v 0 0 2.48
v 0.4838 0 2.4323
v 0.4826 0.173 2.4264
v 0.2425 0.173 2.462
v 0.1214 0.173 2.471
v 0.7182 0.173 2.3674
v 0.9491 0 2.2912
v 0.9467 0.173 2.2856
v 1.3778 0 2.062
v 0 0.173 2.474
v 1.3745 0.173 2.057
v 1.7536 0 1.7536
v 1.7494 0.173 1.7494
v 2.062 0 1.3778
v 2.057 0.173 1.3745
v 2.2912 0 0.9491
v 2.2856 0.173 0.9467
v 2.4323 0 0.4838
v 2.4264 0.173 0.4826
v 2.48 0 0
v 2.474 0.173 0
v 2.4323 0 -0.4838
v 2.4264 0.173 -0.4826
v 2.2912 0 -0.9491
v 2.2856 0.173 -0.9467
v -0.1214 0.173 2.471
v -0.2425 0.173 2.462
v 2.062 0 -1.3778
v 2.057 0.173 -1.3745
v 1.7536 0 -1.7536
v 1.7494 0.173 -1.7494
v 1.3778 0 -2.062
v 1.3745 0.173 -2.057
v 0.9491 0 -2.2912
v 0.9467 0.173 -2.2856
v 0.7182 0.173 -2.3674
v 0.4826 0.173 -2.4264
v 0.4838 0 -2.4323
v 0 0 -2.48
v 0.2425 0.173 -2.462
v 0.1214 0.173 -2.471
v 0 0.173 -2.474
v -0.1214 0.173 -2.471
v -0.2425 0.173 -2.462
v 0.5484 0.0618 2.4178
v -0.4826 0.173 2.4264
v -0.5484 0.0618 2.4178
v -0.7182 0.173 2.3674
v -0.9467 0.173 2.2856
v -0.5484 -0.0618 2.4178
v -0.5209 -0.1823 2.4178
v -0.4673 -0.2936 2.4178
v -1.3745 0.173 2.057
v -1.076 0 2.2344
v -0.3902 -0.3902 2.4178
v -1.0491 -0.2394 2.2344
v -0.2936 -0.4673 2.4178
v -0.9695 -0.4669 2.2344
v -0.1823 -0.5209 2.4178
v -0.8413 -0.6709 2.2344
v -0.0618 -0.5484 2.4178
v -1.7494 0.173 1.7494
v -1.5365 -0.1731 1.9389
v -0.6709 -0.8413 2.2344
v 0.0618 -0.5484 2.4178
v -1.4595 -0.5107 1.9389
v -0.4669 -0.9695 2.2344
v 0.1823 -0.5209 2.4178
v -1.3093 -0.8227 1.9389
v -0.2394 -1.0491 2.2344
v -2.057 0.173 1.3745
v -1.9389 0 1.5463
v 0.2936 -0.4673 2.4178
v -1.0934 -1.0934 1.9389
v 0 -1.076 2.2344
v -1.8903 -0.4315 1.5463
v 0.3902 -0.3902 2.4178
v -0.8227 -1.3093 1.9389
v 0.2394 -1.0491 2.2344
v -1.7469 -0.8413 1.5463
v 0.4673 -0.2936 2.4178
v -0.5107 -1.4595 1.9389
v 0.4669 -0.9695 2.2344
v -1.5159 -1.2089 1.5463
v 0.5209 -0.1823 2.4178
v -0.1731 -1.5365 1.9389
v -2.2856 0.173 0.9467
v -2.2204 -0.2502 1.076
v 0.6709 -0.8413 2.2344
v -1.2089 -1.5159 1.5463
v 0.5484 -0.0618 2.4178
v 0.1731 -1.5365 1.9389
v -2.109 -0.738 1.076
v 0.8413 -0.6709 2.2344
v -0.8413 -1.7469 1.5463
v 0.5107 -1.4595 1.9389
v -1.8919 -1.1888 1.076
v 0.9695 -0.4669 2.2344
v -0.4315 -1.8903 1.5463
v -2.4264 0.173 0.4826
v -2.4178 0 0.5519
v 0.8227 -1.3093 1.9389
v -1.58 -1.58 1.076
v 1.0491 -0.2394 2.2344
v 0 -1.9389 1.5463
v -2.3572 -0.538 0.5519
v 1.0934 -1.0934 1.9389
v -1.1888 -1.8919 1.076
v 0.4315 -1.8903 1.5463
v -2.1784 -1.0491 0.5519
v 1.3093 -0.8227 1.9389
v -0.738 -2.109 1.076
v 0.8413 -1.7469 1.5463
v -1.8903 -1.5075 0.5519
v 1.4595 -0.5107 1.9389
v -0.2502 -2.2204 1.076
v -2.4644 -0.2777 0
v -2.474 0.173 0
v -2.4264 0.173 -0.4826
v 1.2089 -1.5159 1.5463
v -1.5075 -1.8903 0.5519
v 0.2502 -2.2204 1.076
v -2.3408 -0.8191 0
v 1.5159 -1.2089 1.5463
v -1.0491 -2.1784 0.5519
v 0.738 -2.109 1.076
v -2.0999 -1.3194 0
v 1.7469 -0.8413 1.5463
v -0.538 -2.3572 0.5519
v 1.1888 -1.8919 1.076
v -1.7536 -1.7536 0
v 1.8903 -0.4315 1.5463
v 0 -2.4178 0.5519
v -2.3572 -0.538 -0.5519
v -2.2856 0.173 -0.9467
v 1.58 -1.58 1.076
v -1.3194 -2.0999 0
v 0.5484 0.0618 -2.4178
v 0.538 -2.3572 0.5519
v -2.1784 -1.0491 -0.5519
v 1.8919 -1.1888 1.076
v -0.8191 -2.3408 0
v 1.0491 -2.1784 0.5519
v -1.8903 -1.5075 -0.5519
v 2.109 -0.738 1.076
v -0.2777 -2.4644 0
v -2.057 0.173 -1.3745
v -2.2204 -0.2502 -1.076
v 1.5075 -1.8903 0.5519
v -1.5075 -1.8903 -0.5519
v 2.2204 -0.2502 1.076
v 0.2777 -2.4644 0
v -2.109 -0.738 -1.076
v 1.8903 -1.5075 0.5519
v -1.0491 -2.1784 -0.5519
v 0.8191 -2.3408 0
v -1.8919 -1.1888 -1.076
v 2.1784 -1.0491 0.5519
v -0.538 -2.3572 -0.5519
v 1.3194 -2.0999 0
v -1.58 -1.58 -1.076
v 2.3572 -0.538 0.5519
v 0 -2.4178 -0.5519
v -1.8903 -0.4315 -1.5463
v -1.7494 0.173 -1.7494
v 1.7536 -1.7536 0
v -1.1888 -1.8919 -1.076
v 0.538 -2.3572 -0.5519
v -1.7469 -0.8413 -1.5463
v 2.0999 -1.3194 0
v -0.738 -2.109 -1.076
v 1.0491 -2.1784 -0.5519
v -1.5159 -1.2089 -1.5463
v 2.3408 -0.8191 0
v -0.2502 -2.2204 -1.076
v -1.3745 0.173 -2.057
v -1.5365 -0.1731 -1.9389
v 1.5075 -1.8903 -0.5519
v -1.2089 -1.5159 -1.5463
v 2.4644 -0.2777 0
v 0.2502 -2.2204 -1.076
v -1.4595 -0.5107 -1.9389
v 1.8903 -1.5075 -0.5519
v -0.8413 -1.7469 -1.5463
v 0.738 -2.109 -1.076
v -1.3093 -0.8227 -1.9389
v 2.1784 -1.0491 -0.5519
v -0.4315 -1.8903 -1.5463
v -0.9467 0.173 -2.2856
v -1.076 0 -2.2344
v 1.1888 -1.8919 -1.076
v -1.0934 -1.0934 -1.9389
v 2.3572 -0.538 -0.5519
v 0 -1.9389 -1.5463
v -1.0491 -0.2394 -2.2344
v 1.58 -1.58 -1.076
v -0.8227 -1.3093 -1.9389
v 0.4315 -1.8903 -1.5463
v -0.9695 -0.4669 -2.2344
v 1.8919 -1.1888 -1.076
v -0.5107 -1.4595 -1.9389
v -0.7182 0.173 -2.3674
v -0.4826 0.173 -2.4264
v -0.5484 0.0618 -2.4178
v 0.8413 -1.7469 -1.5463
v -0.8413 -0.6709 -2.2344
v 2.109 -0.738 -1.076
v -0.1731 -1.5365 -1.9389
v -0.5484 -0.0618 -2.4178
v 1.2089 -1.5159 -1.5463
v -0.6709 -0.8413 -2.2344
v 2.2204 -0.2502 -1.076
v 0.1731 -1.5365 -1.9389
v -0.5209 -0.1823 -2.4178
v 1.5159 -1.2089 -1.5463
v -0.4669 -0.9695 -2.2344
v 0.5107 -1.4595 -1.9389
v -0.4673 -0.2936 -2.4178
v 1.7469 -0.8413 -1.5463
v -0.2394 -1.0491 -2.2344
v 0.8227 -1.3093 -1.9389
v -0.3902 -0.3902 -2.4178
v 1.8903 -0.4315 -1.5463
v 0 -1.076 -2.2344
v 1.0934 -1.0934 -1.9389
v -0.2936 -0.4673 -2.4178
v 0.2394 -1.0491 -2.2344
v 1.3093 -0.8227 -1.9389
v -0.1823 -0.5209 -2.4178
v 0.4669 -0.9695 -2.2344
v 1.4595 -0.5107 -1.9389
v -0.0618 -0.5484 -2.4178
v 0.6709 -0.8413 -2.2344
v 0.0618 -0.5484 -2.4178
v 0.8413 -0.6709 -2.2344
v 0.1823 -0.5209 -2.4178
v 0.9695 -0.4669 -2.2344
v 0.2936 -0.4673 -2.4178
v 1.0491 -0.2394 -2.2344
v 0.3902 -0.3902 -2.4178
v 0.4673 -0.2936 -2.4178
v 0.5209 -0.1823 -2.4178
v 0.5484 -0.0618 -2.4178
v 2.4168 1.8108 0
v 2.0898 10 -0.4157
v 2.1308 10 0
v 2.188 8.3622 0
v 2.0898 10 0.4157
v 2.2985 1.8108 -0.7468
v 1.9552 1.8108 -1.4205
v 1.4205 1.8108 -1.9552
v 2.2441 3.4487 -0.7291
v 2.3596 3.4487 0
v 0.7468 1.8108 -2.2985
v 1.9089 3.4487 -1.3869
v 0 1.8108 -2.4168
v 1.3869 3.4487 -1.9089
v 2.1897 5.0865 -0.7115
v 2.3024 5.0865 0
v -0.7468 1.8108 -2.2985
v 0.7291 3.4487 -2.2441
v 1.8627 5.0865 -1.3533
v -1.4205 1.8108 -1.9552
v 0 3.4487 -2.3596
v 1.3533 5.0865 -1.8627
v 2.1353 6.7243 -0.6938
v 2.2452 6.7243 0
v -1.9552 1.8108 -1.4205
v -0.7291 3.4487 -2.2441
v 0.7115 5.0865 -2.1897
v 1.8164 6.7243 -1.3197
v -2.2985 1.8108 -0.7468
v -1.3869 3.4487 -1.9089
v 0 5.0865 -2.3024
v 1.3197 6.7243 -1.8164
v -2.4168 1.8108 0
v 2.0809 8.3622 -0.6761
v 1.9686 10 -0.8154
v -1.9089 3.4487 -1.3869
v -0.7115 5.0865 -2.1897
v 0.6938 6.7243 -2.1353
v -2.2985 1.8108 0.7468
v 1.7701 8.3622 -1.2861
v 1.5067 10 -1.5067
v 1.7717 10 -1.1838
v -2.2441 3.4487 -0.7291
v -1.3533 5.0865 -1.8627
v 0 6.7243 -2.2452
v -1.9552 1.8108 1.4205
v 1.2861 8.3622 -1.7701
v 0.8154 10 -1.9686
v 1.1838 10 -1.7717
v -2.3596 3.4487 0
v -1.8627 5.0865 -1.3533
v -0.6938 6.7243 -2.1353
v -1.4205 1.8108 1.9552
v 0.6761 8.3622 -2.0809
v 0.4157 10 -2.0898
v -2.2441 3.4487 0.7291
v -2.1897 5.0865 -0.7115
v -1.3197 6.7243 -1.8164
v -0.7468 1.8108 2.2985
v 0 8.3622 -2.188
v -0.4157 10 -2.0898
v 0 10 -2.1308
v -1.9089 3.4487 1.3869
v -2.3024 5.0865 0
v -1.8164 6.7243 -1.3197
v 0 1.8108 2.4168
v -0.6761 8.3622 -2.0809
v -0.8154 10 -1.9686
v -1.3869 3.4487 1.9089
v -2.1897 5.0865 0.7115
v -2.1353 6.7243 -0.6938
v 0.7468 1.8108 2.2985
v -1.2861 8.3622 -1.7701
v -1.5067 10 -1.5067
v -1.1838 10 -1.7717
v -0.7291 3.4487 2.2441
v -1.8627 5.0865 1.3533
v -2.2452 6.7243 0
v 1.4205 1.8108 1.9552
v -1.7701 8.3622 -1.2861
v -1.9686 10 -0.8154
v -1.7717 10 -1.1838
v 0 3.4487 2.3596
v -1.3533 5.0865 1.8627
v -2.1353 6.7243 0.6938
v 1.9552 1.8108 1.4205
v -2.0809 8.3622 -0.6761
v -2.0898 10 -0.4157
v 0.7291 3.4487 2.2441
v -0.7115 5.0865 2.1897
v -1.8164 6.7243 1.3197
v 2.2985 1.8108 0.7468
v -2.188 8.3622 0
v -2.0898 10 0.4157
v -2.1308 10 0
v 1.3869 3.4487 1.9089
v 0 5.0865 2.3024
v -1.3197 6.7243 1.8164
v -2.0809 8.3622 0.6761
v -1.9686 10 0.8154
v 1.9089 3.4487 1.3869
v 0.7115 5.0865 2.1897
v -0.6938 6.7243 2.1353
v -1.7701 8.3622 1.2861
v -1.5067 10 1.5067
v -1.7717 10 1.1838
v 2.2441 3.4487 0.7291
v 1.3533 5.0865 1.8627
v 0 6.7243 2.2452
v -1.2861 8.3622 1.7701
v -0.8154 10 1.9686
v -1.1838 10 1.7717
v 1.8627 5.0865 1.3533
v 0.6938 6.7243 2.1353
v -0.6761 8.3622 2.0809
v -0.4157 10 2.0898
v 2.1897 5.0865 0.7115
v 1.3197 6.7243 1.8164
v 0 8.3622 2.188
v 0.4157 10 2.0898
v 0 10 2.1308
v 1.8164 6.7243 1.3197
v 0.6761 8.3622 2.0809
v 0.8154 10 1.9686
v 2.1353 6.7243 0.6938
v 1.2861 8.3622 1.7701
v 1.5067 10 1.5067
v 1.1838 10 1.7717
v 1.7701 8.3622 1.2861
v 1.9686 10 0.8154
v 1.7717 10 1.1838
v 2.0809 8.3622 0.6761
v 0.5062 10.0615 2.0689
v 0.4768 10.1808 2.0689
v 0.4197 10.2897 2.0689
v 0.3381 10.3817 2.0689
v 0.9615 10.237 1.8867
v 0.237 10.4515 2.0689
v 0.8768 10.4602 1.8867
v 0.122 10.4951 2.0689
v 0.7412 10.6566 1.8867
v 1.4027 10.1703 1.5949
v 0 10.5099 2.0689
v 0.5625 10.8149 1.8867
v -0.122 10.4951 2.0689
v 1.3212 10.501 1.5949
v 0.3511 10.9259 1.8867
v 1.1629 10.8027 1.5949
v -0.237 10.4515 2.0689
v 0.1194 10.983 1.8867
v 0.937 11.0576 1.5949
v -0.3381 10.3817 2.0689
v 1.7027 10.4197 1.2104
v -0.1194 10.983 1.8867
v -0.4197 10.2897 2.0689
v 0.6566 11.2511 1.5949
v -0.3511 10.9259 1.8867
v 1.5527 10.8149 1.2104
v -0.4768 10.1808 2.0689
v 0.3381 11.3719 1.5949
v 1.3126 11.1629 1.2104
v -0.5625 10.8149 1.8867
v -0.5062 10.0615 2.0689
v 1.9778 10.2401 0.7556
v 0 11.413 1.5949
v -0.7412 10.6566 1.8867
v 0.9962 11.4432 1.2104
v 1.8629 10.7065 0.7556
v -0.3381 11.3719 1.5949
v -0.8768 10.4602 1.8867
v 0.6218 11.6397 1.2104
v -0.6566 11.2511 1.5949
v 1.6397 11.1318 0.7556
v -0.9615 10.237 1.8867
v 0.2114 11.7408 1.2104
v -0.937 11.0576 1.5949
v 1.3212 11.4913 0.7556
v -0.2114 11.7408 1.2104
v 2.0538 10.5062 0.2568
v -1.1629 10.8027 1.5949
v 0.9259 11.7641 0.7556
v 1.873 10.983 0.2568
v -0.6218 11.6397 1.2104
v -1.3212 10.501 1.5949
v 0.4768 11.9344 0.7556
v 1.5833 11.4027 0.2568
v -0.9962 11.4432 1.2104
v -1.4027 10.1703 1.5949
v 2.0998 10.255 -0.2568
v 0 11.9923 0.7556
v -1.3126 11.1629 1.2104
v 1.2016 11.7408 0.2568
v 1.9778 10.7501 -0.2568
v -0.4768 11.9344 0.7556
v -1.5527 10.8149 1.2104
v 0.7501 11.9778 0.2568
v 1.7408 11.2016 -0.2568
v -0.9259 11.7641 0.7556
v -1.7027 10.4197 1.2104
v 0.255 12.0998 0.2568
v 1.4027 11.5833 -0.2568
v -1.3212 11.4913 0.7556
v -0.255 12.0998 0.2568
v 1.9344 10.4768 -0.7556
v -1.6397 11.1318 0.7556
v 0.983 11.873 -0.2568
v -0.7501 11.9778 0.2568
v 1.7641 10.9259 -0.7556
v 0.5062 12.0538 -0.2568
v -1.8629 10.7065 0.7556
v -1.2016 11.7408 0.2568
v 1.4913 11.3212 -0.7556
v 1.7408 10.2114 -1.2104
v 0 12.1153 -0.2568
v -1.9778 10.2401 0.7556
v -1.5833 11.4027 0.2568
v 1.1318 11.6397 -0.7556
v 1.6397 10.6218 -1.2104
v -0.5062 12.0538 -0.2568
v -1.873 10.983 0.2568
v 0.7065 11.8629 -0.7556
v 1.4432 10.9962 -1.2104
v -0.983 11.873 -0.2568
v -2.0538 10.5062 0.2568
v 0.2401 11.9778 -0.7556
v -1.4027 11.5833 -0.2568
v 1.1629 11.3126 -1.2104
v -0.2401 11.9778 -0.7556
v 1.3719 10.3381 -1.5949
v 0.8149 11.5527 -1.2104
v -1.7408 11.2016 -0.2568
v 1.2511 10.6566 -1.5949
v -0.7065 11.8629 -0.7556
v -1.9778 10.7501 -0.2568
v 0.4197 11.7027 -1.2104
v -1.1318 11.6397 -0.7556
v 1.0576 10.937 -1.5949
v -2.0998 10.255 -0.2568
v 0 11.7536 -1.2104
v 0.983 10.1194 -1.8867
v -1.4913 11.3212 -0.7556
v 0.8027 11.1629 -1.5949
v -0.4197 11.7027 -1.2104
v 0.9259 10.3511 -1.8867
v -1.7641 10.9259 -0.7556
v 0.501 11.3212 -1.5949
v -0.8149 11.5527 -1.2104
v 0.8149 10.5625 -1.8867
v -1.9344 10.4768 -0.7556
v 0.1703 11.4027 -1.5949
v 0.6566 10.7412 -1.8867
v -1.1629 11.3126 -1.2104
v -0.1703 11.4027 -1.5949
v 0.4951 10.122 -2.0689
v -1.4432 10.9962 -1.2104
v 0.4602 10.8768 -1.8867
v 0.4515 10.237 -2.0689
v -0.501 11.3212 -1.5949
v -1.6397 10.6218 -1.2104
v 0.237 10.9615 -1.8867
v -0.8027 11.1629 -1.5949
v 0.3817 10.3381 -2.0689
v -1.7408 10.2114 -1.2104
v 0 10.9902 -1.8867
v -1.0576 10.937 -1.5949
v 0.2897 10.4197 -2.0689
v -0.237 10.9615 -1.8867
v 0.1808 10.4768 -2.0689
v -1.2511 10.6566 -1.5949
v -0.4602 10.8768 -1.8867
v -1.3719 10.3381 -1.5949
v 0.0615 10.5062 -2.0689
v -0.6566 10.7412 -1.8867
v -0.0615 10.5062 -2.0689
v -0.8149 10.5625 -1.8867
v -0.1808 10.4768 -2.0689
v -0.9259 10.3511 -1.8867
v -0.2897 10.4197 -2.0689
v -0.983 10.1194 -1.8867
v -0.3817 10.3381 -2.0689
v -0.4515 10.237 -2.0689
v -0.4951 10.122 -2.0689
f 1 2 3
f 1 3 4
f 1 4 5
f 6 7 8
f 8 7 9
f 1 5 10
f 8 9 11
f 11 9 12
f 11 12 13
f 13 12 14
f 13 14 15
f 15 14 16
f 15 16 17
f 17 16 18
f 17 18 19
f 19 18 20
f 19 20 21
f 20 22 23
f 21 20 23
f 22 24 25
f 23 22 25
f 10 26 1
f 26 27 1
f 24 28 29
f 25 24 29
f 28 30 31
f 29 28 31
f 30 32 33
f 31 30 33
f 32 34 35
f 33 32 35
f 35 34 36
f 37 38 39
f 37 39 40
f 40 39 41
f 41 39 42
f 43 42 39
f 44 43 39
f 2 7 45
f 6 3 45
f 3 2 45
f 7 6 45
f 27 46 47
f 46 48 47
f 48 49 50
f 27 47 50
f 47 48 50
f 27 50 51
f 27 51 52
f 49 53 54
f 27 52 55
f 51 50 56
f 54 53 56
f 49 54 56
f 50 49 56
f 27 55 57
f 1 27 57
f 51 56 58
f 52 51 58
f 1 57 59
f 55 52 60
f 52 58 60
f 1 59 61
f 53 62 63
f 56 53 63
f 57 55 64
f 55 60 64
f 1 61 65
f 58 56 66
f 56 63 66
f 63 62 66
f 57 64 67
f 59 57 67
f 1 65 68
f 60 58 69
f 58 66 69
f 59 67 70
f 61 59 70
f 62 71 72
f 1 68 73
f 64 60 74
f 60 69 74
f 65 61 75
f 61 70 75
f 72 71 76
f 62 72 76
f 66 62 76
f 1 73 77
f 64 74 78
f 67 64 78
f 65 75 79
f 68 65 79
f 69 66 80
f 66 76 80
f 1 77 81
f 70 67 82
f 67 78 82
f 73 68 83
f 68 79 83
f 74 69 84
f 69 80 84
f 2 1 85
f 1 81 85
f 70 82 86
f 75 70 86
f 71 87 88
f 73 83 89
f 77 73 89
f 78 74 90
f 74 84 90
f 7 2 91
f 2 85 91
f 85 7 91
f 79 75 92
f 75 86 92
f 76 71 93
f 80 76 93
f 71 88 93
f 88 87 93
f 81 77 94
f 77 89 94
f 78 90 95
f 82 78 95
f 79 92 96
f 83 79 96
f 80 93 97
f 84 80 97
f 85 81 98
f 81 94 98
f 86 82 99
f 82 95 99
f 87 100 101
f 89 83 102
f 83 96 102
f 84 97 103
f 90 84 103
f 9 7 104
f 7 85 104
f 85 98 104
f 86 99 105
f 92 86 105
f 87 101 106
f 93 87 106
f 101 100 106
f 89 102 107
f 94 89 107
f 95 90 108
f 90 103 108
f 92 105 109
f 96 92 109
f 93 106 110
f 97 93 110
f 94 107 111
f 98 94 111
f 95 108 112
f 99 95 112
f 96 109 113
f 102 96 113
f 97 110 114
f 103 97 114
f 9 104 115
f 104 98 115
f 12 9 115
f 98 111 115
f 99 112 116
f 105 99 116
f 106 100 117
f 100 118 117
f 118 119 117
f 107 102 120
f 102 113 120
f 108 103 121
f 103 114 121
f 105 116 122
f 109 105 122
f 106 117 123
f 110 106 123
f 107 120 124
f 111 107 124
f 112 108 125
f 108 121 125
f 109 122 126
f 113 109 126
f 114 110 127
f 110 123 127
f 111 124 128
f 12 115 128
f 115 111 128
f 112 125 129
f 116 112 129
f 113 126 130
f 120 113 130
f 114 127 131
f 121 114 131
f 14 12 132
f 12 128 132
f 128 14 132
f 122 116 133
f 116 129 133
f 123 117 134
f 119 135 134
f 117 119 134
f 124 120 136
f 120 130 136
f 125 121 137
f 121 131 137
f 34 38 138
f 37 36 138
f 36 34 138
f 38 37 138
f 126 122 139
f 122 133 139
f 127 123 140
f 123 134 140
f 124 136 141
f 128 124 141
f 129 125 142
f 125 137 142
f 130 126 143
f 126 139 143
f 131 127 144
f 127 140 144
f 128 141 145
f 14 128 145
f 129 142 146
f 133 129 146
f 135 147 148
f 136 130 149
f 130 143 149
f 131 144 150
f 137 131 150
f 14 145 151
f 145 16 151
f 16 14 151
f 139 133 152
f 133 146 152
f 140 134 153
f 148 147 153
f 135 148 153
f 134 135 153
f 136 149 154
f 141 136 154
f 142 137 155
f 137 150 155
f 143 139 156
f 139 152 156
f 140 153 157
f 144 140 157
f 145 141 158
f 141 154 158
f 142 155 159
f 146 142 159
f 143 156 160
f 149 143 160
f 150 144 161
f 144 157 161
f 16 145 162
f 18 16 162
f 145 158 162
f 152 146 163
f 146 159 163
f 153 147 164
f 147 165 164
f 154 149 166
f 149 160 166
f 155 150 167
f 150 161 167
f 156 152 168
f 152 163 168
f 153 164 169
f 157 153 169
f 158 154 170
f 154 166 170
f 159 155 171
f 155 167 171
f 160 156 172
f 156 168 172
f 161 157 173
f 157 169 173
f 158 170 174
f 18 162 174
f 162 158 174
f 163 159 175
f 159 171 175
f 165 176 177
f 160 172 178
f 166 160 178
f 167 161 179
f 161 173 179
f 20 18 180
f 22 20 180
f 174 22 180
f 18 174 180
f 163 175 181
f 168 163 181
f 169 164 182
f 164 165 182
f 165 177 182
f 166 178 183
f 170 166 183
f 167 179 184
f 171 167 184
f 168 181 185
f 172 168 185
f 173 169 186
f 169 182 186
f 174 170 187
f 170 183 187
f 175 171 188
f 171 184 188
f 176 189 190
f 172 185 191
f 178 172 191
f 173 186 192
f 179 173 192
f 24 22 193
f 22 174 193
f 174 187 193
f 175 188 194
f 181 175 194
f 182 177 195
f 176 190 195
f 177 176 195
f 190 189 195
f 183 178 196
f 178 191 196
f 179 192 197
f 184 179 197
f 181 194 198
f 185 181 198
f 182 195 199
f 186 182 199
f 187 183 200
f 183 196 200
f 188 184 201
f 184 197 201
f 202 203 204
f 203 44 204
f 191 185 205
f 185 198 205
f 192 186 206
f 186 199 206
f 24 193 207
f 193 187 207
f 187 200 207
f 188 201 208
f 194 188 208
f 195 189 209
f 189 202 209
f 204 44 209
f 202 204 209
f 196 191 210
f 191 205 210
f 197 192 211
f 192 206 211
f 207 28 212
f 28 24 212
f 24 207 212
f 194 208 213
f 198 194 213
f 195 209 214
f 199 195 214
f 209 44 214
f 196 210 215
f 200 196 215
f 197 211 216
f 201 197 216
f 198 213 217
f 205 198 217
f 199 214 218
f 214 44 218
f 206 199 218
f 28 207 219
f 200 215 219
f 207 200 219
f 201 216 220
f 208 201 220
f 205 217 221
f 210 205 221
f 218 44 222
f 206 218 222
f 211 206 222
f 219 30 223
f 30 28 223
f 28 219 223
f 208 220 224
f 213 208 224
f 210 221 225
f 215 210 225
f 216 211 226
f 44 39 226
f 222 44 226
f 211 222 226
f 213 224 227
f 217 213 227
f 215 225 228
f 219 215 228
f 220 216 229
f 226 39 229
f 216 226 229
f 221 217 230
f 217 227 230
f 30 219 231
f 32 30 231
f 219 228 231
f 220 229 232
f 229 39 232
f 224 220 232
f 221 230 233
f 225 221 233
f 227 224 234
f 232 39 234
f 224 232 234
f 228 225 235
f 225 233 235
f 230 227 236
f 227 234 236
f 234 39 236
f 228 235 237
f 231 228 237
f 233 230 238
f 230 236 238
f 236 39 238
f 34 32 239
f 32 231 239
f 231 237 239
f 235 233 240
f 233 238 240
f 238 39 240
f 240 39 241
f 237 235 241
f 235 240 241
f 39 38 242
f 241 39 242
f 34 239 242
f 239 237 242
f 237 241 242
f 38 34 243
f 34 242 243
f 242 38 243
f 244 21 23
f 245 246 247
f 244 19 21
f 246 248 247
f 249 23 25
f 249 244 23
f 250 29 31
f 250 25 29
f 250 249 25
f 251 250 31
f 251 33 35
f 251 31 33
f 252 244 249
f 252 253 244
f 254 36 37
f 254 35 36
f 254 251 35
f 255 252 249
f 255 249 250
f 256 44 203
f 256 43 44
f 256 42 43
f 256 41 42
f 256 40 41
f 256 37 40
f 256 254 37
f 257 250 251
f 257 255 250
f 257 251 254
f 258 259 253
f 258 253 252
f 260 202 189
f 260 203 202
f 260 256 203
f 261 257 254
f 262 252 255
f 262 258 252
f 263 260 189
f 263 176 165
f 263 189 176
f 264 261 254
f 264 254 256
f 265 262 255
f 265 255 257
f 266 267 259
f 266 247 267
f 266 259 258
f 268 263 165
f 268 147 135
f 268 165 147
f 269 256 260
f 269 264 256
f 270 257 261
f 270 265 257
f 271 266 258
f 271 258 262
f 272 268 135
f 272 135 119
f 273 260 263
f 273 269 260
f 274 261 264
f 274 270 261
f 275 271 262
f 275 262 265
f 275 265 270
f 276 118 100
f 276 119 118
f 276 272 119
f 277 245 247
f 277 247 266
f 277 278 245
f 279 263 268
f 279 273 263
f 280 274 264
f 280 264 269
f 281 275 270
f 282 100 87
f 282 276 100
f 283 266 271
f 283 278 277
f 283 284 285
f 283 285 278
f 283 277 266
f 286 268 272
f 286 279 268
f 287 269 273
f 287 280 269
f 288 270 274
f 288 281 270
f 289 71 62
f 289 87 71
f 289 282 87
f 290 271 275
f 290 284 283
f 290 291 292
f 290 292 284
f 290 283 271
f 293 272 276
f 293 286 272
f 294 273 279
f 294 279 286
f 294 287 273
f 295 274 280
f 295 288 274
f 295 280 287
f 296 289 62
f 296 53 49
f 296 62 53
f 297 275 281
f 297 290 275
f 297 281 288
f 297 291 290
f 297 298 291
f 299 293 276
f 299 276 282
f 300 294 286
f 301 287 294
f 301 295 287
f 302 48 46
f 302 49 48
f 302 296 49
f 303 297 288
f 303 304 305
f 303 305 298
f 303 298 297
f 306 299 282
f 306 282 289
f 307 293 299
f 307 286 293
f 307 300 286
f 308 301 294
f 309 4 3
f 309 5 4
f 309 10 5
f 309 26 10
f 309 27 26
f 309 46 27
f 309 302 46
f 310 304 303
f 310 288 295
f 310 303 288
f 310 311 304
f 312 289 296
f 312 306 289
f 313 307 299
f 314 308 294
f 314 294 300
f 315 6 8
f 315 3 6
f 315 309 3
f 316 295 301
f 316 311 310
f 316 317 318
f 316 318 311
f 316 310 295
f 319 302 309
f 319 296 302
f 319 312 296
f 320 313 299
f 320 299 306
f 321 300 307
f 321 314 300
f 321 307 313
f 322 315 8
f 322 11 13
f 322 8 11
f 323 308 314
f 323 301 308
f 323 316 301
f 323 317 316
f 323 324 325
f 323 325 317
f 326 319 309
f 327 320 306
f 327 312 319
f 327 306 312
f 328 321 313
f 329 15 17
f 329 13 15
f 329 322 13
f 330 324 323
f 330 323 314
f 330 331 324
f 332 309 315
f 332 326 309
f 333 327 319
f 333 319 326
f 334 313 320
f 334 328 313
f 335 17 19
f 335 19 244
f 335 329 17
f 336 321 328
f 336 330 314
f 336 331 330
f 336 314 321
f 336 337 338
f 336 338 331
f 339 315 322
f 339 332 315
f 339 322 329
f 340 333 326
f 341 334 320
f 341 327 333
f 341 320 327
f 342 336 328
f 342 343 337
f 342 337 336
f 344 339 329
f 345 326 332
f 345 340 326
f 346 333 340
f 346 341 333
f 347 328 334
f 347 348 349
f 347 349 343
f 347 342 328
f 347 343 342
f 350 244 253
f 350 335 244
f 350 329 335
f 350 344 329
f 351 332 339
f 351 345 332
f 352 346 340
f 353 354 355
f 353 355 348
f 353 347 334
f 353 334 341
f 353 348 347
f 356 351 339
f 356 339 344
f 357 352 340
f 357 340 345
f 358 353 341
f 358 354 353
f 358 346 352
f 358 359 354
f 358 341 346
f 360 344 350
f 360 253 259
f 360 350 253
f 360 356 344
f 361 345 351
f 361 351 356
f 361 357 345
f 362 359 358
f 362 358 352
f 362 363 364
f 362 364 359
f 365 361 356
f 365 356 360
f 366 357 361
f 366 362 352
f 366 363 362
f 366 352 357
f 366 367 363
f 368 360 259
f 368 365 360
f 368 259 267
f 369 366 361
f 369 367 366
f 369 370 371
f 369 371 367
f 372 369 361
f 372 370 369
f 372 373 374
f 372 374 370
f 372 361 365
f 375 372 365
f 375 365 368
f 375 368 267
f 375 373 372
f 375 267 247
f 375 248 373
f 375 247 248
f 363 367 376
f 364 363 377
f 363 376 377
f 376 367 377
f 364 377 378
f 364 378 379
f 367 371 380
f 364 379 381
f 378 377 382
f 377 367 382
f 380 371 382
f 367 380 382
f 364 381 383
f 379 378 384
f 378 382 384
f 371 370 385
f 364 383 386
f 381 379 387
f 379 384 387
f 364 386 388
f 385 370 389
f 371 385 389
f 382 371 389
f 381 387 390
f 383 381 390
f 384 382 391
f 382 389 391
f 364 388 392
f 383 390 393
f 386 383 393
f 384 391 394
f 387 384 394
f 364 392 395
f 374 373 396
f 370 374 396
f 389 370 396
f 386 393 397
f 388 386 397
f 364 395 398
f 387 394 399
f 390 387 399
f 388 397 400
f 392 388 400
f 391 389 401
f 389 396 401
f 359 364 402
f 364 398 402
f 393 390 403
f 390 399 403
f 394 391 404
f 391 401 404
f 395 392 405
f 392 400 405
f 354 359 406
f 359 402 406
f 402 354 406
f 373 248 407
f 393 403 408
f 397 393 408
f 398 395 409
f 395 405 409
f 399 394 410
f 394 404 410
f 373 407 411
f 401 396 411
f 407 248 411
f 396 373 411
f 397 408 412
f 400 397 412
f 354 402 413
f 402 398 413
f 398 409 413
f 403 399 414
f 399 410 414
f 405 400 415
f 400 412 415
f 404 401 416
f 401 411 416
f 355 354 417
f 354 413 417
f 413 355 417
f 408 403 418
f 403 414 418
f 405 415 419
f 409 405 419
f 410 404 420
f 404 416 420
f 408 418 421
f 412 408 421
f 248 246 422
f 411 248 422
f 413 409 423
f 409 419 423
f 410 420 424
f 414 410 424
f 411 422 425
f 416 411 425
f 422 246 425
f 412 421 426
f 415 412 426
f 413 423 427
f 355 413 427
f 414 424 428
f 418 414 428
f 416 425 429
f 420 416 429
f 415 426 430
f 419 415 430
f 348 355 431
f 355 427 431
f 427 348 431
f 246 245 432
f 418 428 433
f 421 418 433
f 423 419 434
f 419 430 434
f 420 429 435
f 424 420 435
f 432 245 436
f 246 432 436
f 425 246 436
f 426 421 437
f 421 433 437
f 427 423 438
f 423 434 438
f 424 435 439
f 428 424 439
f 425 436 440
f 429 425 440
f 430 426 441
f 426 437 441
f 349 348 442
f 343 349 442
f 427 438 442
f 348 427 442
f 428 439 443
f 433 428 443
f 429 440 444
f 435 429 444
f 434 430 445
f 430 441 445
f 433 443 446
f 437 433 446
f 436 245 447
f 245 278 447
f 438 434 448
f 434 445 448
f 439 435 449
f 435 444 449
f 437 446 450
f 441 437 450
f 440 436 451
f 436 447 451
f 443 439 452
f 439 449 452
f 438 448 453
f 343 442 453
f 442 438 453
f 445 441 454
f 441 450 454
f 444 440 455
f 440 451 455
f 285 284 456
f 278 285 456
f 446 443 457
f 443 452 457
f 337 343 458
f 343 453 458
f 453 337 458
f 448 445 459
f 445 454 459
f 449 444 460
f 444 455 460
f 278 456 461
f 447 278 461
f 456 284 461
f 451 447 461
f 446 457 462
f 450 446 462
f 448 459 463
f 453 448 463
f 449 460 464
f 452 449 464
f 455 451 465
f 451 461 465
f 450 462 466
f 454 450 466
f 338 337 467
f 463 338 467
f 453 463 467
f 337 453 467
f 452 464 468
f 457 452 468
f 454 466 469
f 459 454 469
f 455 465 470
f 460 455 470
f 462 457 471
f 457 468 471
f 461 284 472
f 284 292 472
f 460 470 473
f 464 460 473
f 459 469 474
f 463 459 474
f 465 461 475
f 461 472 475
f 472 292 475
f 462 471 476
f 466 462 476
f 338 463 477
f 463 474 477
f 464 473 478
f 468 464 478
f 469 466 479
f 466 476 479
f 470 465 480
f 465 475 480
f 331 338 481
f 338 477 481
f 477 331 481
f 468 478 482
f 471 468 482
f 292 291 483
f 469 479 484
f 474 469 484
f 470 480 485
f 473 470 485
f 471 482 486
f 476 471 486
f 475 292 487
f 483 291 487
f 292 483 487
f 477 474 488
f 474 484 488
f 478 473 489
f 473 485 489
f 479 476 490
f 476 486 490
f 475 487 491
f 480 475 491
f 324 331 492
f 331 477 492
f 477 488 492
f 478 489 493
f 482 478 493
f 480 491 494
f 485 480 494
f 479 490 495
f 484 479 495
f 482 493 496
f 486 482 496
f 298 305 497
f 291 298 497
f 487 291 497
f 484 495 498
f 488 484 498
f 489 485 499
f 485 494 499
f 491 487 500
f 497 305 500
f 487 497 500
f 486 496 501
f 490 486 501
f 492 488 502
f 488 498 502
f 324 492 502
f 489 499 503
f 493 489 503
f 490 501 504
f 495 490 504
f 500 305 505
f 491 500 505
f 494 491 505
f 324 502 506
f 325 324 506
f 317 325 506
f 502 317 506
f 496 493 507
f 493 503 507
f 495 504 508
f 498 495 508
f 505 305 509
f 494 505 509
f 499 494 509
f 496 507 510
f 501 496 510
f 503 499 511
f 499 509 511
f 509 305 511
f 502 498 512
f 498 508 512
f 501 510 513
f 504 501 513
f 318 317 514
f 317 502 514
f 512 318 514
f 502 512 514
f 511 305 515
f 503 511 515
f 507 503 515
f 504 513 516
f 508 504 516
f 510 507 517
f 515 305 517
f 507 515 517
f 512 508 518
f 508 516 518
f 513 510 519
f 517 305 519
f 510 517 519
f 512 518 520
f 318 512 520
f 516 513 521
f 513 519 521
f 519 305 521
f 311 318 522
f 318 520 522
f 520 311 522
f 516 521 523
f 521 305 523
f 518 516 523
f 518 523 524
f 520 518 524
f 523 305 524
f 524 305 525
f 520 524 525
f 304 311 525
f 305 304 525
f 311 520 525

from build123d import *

# Parameters (mm, degrees)
SKETCH2_R           = 2.48
BOSS_EXTRUDE1_DEPTH = 10
BOSS_EXTRUDE1_TAPER = 2


with BuildPart() as part:
    # Sketch1 → Revolve1 (revolve)
    with BuildSketch(Plane(origin=(0, 0, 0), x_dir=(1, 0, 0), z_dir=(0, 1, 0))):
        with BuildLine():
            Line((0, 2.48), (0, -2.48))
            ThreePointArc((0, -2.48), (2.48, 0), (0, 2.48))
        make_face()
    revolve(axis=Axis((0, 0, -2.48), (0, 0, 1)))

    # Sketch2 → Boss-Extrude1 (add)
    with BuildSketch(Plane(origin=(0, 0, 0), x_dir=(1, 0, 0), z_dir=(0, 1, 0))):
        Circle(SKETCH2_R)
    extrude(amount=BOSS_EXTRUDE1_DEPTH, taper=BOSS_EXTRUDE1_TAPER)

    # Sketch3 → Revolve2 (revolve)
    with BuildSketch(Plane(origin=(0, 10, 0), x_dir=(1, 0, 0), z_dir=(0, 1, 0))):
        with BuildLine():
            Line((0, 2.130792305), (0, -2.130792305))
            ThreePointArc((0, -2.130792305), (2.130792305, 0), (0, 2.130792305))
        make_face()
    revolve(axis=Axis((0, 10, -2.130792305), (0, 0, 1)))


solid = part.part
